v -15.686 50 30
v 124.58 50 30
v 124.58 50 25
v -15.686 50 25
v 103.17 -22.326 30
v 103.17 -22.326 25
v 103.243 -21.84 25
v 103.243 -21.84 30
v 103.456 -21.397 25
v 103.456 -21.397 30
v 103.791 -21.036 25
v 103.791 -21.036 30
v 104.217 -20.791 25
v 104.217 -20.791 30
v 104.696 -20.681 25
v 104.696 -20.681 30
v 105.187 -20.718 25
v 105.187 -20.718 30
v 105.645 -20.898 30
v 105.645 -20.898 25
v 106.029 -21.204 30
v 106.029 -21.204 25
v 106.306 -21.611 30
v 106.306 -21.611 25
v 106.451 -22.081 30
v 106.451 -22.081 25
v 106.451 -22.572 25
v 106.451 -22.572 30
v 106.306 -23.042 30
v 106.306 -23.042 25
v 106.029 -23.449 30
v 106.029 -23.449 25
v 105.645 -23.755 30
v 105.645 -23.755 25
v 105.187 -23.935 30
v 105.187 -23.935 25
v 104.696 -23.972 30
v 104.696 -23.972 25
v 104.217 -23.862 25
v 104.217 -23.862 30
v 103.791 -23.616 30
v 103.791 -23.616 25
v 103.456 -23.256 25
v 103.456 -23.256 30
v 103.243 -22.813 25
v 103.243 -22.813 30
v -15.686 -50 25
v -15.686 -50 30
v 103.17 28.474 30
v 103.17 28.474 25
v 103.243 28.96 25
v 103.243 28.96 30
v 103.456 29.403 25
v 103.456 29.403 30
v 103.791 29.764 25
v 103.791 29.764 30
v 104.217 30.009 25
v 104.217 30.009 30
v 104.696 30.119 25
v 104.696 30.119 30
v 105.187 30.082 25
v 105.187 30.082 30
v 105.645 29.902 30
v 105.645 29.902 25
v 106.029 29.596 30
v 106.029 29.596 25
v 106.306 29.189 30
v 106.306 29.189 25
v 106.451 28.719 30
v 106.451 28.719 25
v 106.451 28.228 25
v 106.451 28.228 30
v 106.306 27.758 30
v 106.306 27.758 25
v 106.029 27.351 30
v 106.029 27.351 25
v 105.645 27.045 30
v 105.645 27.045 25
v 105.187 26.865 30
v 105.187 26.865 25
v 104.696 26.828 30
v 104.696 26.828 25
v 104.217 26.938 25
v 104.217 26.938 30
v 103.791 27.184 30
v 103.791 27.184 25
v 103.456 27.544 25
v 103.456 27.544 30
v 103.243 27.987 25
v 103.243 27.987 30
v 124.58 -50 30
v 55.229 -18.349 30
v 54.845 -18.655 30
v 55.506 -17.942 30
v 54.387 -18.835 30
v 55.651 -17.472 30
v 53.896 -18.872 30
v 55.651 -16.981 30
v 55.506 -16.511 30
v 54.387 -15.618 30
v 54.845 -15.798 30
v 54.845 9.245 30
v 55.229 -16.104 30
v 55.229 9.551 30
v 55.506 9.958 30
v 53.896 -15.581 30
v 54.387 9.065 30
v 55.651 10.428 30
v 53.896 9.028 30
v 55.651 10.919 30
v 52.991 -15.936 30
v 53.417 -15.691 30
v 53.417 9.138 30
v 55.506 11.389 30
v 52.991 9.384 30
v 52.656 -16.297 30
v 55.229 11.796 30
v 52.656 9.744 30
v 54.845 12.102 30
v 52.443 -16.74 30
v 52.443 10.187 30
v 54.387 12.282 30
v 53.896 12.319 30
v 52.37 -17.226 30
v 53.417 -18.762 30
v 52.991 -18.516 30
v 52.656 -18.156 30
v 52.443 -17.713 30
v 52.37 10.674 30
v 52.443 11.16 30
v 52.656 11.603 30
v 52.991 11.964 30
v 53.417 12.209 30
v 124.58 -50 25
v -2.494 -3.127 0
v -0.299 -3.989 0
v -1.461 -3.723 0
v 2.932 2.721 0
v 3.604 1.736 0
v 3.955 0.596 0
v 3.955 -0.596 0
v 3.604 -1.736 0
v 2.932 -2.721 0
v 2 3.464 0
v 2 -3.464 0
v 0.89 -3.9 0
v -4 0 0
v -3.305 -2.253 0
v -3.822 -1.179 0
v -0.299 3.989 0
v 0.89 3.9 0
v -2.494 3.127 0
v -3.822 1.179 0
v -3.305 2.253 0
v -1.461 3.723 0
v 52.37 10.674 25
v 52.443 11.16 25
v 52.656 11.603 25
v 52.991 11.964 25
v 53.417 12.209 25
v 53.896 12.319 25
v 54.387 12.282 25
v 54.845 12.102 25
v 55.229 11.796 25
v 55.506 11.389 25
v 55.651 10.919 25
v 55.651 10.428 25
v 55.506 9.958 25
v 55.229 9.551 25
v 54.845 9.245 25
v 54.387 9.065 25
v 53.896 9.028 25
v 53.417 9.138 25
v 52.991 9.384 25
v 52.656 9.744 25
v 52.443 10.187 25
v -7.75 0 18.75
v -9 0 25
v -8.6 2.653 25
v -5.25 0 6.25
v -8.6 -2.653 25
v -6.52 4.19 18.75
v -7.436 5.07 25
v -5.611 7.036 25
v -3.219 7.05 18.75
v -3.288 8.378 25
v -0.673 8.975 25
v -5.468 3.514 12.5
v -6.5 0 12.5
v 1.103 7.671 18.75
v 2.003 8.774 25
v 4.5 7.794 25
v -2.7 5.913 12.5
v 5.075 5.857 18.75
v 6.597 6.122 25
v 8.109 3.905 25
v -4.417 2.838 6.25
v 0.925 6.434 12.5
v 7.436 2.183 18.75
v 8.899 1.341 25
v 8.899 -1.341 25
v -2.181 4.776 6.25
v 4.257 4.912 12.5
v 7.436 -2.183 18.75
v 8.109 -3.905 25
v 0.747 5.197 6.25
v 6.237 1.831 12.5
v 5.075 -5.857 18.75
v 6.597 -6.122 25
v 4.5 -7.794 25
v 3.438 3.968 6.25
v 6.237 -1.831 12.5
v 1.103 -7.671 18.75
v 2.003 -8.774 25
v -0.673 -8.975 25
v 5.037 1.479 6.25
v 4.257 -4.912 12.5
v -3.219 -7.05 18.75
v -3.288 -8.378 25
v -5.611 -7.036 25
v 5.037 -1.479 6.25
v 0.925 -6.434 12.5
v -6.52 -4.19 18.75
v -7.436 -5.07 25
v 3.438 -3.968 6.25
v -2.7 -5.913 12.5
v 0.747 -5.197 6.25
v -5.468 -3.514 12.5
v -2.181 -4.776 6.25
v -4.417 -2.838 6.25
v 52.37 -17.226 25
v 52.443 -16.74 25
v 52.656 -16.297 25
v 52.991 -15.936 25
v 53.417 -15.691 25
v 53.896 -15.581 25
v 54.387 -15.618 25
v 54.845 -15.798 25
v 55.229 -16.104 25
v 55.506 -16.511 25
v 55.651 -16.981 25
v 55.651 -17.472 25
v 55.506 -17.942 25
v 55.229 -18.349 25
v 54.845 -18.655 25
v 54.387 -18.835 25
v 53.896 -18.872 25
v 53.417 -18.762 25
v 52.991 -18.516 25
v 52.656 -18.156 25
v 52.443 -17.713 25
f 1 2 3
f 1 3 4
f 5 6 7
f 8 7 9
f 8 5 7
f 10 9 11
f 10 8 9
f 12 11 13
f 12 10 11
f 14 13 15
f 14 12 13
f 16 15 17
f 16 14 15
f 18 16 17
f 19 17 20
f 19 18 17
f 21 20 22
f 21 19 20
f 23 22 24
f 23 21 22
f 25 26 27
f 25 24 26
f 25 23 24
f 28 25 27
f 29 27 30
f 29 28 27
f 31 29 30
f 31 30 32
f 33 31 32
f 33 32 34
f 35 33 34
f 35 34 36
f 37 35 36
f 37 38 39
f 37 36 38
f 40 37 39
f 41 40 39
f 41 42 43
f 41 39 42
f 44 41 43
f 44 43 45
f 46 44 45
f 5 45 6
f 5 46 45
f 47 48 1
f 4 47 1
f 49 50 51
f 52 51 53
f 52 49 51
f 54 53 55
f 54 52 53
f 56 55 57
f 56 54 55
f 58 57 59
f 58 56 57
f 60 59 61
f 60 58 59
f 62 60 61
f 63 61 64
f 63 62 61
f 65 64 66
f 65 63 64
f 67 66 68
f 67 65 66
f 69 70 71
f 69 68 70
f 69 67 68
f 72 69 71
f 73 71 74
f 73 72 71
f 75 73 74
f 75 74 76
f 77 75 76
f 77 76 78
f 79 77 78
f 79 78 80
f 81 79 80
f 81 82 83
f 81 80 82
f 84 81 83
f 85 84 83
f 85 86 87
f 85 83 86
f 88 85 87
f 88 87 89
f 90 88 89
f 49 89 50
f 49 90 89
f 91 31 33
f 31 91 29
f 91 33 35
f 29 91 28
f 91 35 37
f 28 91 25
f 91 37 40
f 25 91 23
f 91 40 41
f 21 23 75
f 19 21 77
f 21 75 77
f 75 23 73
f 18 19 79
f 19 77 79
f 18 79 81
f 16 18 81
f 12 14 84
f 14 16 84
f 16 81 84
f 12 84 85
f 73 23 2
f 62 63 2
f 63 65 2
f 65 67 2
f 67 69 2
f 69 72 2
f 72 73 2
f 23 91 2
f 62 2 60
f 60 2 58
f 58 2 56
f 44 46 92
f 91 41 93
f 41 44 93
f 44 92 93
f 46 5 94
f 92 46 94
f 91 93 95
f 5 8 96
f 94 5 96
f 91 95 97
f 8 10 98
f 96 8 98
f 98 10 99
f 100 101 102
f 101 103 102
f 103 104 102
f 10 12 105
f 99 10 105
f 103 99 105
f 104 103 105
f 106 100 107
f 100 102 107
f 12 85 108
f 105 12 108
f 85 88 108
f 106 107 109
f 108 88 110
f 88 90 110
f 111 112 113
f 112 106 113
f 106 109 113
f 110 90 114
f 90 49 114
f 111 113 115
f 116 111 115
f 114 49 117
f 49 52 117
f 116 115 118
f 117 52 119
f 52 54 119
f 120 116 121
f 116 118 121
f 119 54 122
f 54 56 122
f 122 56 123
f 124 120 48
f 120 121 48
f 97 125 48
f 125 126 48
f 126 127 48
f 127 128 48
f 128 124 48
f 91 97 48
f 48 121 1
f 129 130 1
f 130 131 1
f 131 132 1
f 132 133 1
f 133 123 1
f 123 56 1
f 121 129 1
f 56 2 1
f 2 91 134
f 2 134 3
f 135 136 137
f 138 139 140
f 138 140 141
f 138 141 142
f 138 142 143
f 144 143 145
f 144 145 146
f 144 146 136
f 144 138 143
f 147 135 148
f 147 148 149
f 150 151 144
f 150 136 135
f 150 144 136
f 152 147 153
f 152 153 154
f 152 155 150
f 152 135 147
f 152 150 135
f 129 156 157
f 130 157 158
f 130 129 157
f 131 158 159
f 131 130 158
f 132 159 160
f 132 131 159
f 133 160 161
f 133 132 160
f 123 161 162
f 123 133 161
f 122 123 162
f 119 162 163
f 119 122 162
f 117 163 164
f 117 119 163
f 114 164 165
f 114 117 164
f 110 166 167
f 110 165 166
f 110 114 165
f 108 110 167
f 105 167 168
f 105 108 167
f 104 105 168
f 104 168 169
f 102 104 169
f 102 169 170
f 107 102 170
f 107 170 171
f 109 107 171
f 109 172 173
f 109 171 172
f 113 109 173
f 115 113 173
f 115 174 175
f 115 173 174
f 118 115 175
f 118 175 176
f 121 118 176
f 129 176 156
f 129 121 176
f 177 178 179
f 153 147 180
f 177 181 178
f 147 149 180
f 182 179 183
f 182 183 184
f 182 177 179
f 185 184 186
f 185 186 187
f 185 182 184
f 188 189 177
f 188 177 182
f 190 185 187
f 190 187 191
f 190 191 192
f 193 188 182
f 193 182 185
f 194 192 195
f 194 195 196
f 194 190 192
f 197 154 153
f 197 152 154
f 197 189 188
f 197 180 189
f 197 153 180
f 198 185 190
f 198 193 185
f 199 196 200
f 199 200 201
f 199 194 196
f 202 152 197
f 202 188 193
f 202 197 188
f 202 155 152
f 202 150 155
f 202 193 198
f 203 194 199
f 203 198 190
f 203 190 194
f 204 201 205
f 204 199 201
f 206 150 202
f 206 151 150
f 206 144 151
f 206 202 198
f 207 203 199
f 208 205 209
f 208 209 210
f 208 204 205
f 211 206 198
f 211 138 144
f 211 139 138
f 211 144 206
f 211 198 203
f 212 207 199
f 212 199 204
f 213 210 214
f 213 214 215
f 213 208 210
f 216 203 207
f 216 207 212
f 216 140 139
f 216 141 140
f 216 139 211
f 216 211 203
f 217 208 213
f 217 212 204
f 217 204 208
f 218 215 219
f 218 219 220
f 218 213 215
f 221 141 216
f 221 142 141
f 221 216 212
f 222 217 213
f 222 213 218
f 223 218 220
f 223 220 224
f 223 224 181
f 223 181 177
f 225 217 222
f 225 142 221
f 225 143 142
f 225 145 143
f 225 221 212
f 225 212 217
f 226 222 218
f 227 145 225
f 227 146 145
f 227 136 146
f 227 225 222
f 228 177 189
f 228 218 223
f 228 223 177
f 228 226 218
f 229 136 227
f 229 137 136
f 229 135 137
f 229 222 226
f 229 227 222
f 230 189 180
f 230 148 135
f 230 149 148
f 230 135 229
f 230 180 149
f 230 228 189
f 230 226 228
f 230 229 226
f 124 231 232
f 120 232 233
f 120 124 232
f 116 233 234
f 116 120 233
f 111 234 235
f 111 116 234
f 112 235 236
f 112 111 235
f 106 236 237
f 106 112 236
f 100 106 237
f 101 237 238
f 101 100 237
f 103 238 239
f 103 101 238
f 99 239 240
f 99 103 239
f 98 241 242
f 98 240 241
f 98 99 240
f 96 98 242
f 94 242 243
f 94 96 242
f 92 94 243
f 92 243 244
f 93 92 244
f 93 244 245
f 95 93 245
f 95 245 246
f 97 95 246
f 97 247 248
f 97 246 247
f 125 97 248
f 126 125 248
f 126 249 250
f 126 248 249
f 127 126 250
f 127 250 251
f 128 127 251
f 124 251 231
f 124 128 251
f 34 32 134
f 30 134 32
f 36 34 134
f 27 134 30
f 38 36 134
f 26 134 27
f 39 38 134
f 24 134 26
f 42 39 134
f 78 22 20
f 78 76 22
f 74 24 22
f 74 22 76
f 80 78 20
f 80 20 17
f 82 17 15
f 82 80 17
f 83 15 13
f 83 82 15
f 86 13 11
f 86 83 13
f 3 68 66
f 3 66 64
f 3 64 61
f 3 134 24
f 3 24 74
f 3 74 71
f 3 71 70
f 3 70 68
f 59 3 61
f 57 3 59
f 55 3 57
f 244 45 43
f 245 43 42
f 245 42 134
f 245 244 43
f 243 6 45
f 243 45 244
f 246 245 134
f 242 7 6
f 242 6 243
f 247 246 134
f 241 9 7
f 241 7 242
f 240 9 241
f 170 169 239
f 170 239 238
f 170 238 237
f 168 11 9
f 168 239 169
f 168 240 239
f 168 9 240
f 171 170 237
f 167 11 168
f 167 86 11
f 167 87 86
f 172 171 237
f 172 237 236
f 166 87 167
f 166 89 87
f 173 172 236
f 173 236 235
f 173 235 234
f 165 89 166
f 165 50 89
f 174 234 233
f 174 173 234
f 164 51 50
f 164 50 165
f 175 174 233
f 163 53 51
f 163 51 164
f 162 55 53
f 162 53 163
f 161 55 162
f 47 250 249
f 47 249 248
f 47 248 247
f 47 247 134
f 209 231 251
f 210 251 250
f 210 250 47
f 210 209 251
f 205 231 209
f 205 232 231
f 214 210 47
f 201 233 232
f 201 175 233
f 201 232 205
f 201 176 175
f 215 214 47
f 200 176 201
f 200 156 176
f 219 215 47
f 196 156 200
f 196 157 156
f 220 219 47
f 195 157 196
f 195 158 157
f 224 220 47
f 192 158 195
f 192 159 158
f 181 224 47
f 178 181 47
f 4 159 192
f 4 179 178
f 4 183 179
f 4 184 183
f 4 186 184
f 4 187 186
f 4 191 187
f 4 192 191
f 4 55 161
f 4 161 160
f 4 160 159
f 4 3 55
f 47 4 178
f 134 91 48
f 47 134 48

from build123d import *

# Parameters (mm, degrees)
SKETCH_R                  = 1.65
PAD_DEPTH                 = 10
SKETCH001_W               = 140.265109
SKETCH001_H               = 100
PAD003_DEPTH              = 5
FUSION008_PLACEMENT_ANGLE = 180


with BuildPart() as pad:
    # Sketch → Pad (new body)
    with BuildSketch(Plane.XY):
        with Locations((4.180322, -22.326468)):
            Circle(SKETCH_R)
        with Locations((4.180322, 28.473532)):
            Circle(SKETCH_R)
        with Locations((54.980322, -17.226468)):
            Circle(SKETCH_R)
        with Locations((54.980322, 10.673532)):
            Circle(SKETCH_R)
    extrude(amount=PAD_DEPTH)


with BuildPart() as cut:
    # Sketch001 → Pad003 (new body)
    with BuildSketch(Plane.XY):
        with Locations((54.553008, 0)):
            Rectangle(SKETCH001_W, SKETCH001_H)
    extrude(amount=PAD003_DEPTH)

    # Cut: cut Pad
    add(pad.part, mode=Mode.SUBTRACT)


with BuildPart() as placa:
    # Cone → Cone (revolve)
    with BuildSketch(Plane(origin=(109, 0, 0), x_dir=(1, 0, 0), z_dir=(0, -1, 0))):
        Polygon((0, 0), (10, 0), (4, 30), (0, 30), align=None)
    revolve(axis=Axis((109, 0, 0), (0, 0, 1)))

    # Fusion008: union Cut
    add(cut.part)


with BuildPart() as placa_1:
    # Fusion008 placement: moved
    add(placa.part.moved(Location((109, 0, 30))).rotate(Axis((109, 0, 30), (0, 1, 0)), FUSION008_PLACEMENT_ANGLE))


solid = placa_1.part
